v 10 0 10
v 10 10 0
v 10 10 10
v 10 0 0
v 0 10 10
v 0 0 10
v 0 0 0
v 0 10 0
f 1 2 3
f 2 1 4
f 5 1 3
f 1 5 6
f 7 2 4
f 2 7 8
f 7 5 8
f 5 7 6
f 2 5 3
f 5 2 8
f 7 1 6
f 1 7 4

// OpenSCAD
// The colliding primitive comes from a library on OPENSCADPATH (MCAD). Library
// steps are dropped from the chain, leaving only the translate from this file.
use <MCAD/shapes.scad>
cube(10);                          // part 1
translate([5, 5, 5]) box(4, 4, 4); // part 2: centered 4mm cube fully inside part 1, overlap 64
